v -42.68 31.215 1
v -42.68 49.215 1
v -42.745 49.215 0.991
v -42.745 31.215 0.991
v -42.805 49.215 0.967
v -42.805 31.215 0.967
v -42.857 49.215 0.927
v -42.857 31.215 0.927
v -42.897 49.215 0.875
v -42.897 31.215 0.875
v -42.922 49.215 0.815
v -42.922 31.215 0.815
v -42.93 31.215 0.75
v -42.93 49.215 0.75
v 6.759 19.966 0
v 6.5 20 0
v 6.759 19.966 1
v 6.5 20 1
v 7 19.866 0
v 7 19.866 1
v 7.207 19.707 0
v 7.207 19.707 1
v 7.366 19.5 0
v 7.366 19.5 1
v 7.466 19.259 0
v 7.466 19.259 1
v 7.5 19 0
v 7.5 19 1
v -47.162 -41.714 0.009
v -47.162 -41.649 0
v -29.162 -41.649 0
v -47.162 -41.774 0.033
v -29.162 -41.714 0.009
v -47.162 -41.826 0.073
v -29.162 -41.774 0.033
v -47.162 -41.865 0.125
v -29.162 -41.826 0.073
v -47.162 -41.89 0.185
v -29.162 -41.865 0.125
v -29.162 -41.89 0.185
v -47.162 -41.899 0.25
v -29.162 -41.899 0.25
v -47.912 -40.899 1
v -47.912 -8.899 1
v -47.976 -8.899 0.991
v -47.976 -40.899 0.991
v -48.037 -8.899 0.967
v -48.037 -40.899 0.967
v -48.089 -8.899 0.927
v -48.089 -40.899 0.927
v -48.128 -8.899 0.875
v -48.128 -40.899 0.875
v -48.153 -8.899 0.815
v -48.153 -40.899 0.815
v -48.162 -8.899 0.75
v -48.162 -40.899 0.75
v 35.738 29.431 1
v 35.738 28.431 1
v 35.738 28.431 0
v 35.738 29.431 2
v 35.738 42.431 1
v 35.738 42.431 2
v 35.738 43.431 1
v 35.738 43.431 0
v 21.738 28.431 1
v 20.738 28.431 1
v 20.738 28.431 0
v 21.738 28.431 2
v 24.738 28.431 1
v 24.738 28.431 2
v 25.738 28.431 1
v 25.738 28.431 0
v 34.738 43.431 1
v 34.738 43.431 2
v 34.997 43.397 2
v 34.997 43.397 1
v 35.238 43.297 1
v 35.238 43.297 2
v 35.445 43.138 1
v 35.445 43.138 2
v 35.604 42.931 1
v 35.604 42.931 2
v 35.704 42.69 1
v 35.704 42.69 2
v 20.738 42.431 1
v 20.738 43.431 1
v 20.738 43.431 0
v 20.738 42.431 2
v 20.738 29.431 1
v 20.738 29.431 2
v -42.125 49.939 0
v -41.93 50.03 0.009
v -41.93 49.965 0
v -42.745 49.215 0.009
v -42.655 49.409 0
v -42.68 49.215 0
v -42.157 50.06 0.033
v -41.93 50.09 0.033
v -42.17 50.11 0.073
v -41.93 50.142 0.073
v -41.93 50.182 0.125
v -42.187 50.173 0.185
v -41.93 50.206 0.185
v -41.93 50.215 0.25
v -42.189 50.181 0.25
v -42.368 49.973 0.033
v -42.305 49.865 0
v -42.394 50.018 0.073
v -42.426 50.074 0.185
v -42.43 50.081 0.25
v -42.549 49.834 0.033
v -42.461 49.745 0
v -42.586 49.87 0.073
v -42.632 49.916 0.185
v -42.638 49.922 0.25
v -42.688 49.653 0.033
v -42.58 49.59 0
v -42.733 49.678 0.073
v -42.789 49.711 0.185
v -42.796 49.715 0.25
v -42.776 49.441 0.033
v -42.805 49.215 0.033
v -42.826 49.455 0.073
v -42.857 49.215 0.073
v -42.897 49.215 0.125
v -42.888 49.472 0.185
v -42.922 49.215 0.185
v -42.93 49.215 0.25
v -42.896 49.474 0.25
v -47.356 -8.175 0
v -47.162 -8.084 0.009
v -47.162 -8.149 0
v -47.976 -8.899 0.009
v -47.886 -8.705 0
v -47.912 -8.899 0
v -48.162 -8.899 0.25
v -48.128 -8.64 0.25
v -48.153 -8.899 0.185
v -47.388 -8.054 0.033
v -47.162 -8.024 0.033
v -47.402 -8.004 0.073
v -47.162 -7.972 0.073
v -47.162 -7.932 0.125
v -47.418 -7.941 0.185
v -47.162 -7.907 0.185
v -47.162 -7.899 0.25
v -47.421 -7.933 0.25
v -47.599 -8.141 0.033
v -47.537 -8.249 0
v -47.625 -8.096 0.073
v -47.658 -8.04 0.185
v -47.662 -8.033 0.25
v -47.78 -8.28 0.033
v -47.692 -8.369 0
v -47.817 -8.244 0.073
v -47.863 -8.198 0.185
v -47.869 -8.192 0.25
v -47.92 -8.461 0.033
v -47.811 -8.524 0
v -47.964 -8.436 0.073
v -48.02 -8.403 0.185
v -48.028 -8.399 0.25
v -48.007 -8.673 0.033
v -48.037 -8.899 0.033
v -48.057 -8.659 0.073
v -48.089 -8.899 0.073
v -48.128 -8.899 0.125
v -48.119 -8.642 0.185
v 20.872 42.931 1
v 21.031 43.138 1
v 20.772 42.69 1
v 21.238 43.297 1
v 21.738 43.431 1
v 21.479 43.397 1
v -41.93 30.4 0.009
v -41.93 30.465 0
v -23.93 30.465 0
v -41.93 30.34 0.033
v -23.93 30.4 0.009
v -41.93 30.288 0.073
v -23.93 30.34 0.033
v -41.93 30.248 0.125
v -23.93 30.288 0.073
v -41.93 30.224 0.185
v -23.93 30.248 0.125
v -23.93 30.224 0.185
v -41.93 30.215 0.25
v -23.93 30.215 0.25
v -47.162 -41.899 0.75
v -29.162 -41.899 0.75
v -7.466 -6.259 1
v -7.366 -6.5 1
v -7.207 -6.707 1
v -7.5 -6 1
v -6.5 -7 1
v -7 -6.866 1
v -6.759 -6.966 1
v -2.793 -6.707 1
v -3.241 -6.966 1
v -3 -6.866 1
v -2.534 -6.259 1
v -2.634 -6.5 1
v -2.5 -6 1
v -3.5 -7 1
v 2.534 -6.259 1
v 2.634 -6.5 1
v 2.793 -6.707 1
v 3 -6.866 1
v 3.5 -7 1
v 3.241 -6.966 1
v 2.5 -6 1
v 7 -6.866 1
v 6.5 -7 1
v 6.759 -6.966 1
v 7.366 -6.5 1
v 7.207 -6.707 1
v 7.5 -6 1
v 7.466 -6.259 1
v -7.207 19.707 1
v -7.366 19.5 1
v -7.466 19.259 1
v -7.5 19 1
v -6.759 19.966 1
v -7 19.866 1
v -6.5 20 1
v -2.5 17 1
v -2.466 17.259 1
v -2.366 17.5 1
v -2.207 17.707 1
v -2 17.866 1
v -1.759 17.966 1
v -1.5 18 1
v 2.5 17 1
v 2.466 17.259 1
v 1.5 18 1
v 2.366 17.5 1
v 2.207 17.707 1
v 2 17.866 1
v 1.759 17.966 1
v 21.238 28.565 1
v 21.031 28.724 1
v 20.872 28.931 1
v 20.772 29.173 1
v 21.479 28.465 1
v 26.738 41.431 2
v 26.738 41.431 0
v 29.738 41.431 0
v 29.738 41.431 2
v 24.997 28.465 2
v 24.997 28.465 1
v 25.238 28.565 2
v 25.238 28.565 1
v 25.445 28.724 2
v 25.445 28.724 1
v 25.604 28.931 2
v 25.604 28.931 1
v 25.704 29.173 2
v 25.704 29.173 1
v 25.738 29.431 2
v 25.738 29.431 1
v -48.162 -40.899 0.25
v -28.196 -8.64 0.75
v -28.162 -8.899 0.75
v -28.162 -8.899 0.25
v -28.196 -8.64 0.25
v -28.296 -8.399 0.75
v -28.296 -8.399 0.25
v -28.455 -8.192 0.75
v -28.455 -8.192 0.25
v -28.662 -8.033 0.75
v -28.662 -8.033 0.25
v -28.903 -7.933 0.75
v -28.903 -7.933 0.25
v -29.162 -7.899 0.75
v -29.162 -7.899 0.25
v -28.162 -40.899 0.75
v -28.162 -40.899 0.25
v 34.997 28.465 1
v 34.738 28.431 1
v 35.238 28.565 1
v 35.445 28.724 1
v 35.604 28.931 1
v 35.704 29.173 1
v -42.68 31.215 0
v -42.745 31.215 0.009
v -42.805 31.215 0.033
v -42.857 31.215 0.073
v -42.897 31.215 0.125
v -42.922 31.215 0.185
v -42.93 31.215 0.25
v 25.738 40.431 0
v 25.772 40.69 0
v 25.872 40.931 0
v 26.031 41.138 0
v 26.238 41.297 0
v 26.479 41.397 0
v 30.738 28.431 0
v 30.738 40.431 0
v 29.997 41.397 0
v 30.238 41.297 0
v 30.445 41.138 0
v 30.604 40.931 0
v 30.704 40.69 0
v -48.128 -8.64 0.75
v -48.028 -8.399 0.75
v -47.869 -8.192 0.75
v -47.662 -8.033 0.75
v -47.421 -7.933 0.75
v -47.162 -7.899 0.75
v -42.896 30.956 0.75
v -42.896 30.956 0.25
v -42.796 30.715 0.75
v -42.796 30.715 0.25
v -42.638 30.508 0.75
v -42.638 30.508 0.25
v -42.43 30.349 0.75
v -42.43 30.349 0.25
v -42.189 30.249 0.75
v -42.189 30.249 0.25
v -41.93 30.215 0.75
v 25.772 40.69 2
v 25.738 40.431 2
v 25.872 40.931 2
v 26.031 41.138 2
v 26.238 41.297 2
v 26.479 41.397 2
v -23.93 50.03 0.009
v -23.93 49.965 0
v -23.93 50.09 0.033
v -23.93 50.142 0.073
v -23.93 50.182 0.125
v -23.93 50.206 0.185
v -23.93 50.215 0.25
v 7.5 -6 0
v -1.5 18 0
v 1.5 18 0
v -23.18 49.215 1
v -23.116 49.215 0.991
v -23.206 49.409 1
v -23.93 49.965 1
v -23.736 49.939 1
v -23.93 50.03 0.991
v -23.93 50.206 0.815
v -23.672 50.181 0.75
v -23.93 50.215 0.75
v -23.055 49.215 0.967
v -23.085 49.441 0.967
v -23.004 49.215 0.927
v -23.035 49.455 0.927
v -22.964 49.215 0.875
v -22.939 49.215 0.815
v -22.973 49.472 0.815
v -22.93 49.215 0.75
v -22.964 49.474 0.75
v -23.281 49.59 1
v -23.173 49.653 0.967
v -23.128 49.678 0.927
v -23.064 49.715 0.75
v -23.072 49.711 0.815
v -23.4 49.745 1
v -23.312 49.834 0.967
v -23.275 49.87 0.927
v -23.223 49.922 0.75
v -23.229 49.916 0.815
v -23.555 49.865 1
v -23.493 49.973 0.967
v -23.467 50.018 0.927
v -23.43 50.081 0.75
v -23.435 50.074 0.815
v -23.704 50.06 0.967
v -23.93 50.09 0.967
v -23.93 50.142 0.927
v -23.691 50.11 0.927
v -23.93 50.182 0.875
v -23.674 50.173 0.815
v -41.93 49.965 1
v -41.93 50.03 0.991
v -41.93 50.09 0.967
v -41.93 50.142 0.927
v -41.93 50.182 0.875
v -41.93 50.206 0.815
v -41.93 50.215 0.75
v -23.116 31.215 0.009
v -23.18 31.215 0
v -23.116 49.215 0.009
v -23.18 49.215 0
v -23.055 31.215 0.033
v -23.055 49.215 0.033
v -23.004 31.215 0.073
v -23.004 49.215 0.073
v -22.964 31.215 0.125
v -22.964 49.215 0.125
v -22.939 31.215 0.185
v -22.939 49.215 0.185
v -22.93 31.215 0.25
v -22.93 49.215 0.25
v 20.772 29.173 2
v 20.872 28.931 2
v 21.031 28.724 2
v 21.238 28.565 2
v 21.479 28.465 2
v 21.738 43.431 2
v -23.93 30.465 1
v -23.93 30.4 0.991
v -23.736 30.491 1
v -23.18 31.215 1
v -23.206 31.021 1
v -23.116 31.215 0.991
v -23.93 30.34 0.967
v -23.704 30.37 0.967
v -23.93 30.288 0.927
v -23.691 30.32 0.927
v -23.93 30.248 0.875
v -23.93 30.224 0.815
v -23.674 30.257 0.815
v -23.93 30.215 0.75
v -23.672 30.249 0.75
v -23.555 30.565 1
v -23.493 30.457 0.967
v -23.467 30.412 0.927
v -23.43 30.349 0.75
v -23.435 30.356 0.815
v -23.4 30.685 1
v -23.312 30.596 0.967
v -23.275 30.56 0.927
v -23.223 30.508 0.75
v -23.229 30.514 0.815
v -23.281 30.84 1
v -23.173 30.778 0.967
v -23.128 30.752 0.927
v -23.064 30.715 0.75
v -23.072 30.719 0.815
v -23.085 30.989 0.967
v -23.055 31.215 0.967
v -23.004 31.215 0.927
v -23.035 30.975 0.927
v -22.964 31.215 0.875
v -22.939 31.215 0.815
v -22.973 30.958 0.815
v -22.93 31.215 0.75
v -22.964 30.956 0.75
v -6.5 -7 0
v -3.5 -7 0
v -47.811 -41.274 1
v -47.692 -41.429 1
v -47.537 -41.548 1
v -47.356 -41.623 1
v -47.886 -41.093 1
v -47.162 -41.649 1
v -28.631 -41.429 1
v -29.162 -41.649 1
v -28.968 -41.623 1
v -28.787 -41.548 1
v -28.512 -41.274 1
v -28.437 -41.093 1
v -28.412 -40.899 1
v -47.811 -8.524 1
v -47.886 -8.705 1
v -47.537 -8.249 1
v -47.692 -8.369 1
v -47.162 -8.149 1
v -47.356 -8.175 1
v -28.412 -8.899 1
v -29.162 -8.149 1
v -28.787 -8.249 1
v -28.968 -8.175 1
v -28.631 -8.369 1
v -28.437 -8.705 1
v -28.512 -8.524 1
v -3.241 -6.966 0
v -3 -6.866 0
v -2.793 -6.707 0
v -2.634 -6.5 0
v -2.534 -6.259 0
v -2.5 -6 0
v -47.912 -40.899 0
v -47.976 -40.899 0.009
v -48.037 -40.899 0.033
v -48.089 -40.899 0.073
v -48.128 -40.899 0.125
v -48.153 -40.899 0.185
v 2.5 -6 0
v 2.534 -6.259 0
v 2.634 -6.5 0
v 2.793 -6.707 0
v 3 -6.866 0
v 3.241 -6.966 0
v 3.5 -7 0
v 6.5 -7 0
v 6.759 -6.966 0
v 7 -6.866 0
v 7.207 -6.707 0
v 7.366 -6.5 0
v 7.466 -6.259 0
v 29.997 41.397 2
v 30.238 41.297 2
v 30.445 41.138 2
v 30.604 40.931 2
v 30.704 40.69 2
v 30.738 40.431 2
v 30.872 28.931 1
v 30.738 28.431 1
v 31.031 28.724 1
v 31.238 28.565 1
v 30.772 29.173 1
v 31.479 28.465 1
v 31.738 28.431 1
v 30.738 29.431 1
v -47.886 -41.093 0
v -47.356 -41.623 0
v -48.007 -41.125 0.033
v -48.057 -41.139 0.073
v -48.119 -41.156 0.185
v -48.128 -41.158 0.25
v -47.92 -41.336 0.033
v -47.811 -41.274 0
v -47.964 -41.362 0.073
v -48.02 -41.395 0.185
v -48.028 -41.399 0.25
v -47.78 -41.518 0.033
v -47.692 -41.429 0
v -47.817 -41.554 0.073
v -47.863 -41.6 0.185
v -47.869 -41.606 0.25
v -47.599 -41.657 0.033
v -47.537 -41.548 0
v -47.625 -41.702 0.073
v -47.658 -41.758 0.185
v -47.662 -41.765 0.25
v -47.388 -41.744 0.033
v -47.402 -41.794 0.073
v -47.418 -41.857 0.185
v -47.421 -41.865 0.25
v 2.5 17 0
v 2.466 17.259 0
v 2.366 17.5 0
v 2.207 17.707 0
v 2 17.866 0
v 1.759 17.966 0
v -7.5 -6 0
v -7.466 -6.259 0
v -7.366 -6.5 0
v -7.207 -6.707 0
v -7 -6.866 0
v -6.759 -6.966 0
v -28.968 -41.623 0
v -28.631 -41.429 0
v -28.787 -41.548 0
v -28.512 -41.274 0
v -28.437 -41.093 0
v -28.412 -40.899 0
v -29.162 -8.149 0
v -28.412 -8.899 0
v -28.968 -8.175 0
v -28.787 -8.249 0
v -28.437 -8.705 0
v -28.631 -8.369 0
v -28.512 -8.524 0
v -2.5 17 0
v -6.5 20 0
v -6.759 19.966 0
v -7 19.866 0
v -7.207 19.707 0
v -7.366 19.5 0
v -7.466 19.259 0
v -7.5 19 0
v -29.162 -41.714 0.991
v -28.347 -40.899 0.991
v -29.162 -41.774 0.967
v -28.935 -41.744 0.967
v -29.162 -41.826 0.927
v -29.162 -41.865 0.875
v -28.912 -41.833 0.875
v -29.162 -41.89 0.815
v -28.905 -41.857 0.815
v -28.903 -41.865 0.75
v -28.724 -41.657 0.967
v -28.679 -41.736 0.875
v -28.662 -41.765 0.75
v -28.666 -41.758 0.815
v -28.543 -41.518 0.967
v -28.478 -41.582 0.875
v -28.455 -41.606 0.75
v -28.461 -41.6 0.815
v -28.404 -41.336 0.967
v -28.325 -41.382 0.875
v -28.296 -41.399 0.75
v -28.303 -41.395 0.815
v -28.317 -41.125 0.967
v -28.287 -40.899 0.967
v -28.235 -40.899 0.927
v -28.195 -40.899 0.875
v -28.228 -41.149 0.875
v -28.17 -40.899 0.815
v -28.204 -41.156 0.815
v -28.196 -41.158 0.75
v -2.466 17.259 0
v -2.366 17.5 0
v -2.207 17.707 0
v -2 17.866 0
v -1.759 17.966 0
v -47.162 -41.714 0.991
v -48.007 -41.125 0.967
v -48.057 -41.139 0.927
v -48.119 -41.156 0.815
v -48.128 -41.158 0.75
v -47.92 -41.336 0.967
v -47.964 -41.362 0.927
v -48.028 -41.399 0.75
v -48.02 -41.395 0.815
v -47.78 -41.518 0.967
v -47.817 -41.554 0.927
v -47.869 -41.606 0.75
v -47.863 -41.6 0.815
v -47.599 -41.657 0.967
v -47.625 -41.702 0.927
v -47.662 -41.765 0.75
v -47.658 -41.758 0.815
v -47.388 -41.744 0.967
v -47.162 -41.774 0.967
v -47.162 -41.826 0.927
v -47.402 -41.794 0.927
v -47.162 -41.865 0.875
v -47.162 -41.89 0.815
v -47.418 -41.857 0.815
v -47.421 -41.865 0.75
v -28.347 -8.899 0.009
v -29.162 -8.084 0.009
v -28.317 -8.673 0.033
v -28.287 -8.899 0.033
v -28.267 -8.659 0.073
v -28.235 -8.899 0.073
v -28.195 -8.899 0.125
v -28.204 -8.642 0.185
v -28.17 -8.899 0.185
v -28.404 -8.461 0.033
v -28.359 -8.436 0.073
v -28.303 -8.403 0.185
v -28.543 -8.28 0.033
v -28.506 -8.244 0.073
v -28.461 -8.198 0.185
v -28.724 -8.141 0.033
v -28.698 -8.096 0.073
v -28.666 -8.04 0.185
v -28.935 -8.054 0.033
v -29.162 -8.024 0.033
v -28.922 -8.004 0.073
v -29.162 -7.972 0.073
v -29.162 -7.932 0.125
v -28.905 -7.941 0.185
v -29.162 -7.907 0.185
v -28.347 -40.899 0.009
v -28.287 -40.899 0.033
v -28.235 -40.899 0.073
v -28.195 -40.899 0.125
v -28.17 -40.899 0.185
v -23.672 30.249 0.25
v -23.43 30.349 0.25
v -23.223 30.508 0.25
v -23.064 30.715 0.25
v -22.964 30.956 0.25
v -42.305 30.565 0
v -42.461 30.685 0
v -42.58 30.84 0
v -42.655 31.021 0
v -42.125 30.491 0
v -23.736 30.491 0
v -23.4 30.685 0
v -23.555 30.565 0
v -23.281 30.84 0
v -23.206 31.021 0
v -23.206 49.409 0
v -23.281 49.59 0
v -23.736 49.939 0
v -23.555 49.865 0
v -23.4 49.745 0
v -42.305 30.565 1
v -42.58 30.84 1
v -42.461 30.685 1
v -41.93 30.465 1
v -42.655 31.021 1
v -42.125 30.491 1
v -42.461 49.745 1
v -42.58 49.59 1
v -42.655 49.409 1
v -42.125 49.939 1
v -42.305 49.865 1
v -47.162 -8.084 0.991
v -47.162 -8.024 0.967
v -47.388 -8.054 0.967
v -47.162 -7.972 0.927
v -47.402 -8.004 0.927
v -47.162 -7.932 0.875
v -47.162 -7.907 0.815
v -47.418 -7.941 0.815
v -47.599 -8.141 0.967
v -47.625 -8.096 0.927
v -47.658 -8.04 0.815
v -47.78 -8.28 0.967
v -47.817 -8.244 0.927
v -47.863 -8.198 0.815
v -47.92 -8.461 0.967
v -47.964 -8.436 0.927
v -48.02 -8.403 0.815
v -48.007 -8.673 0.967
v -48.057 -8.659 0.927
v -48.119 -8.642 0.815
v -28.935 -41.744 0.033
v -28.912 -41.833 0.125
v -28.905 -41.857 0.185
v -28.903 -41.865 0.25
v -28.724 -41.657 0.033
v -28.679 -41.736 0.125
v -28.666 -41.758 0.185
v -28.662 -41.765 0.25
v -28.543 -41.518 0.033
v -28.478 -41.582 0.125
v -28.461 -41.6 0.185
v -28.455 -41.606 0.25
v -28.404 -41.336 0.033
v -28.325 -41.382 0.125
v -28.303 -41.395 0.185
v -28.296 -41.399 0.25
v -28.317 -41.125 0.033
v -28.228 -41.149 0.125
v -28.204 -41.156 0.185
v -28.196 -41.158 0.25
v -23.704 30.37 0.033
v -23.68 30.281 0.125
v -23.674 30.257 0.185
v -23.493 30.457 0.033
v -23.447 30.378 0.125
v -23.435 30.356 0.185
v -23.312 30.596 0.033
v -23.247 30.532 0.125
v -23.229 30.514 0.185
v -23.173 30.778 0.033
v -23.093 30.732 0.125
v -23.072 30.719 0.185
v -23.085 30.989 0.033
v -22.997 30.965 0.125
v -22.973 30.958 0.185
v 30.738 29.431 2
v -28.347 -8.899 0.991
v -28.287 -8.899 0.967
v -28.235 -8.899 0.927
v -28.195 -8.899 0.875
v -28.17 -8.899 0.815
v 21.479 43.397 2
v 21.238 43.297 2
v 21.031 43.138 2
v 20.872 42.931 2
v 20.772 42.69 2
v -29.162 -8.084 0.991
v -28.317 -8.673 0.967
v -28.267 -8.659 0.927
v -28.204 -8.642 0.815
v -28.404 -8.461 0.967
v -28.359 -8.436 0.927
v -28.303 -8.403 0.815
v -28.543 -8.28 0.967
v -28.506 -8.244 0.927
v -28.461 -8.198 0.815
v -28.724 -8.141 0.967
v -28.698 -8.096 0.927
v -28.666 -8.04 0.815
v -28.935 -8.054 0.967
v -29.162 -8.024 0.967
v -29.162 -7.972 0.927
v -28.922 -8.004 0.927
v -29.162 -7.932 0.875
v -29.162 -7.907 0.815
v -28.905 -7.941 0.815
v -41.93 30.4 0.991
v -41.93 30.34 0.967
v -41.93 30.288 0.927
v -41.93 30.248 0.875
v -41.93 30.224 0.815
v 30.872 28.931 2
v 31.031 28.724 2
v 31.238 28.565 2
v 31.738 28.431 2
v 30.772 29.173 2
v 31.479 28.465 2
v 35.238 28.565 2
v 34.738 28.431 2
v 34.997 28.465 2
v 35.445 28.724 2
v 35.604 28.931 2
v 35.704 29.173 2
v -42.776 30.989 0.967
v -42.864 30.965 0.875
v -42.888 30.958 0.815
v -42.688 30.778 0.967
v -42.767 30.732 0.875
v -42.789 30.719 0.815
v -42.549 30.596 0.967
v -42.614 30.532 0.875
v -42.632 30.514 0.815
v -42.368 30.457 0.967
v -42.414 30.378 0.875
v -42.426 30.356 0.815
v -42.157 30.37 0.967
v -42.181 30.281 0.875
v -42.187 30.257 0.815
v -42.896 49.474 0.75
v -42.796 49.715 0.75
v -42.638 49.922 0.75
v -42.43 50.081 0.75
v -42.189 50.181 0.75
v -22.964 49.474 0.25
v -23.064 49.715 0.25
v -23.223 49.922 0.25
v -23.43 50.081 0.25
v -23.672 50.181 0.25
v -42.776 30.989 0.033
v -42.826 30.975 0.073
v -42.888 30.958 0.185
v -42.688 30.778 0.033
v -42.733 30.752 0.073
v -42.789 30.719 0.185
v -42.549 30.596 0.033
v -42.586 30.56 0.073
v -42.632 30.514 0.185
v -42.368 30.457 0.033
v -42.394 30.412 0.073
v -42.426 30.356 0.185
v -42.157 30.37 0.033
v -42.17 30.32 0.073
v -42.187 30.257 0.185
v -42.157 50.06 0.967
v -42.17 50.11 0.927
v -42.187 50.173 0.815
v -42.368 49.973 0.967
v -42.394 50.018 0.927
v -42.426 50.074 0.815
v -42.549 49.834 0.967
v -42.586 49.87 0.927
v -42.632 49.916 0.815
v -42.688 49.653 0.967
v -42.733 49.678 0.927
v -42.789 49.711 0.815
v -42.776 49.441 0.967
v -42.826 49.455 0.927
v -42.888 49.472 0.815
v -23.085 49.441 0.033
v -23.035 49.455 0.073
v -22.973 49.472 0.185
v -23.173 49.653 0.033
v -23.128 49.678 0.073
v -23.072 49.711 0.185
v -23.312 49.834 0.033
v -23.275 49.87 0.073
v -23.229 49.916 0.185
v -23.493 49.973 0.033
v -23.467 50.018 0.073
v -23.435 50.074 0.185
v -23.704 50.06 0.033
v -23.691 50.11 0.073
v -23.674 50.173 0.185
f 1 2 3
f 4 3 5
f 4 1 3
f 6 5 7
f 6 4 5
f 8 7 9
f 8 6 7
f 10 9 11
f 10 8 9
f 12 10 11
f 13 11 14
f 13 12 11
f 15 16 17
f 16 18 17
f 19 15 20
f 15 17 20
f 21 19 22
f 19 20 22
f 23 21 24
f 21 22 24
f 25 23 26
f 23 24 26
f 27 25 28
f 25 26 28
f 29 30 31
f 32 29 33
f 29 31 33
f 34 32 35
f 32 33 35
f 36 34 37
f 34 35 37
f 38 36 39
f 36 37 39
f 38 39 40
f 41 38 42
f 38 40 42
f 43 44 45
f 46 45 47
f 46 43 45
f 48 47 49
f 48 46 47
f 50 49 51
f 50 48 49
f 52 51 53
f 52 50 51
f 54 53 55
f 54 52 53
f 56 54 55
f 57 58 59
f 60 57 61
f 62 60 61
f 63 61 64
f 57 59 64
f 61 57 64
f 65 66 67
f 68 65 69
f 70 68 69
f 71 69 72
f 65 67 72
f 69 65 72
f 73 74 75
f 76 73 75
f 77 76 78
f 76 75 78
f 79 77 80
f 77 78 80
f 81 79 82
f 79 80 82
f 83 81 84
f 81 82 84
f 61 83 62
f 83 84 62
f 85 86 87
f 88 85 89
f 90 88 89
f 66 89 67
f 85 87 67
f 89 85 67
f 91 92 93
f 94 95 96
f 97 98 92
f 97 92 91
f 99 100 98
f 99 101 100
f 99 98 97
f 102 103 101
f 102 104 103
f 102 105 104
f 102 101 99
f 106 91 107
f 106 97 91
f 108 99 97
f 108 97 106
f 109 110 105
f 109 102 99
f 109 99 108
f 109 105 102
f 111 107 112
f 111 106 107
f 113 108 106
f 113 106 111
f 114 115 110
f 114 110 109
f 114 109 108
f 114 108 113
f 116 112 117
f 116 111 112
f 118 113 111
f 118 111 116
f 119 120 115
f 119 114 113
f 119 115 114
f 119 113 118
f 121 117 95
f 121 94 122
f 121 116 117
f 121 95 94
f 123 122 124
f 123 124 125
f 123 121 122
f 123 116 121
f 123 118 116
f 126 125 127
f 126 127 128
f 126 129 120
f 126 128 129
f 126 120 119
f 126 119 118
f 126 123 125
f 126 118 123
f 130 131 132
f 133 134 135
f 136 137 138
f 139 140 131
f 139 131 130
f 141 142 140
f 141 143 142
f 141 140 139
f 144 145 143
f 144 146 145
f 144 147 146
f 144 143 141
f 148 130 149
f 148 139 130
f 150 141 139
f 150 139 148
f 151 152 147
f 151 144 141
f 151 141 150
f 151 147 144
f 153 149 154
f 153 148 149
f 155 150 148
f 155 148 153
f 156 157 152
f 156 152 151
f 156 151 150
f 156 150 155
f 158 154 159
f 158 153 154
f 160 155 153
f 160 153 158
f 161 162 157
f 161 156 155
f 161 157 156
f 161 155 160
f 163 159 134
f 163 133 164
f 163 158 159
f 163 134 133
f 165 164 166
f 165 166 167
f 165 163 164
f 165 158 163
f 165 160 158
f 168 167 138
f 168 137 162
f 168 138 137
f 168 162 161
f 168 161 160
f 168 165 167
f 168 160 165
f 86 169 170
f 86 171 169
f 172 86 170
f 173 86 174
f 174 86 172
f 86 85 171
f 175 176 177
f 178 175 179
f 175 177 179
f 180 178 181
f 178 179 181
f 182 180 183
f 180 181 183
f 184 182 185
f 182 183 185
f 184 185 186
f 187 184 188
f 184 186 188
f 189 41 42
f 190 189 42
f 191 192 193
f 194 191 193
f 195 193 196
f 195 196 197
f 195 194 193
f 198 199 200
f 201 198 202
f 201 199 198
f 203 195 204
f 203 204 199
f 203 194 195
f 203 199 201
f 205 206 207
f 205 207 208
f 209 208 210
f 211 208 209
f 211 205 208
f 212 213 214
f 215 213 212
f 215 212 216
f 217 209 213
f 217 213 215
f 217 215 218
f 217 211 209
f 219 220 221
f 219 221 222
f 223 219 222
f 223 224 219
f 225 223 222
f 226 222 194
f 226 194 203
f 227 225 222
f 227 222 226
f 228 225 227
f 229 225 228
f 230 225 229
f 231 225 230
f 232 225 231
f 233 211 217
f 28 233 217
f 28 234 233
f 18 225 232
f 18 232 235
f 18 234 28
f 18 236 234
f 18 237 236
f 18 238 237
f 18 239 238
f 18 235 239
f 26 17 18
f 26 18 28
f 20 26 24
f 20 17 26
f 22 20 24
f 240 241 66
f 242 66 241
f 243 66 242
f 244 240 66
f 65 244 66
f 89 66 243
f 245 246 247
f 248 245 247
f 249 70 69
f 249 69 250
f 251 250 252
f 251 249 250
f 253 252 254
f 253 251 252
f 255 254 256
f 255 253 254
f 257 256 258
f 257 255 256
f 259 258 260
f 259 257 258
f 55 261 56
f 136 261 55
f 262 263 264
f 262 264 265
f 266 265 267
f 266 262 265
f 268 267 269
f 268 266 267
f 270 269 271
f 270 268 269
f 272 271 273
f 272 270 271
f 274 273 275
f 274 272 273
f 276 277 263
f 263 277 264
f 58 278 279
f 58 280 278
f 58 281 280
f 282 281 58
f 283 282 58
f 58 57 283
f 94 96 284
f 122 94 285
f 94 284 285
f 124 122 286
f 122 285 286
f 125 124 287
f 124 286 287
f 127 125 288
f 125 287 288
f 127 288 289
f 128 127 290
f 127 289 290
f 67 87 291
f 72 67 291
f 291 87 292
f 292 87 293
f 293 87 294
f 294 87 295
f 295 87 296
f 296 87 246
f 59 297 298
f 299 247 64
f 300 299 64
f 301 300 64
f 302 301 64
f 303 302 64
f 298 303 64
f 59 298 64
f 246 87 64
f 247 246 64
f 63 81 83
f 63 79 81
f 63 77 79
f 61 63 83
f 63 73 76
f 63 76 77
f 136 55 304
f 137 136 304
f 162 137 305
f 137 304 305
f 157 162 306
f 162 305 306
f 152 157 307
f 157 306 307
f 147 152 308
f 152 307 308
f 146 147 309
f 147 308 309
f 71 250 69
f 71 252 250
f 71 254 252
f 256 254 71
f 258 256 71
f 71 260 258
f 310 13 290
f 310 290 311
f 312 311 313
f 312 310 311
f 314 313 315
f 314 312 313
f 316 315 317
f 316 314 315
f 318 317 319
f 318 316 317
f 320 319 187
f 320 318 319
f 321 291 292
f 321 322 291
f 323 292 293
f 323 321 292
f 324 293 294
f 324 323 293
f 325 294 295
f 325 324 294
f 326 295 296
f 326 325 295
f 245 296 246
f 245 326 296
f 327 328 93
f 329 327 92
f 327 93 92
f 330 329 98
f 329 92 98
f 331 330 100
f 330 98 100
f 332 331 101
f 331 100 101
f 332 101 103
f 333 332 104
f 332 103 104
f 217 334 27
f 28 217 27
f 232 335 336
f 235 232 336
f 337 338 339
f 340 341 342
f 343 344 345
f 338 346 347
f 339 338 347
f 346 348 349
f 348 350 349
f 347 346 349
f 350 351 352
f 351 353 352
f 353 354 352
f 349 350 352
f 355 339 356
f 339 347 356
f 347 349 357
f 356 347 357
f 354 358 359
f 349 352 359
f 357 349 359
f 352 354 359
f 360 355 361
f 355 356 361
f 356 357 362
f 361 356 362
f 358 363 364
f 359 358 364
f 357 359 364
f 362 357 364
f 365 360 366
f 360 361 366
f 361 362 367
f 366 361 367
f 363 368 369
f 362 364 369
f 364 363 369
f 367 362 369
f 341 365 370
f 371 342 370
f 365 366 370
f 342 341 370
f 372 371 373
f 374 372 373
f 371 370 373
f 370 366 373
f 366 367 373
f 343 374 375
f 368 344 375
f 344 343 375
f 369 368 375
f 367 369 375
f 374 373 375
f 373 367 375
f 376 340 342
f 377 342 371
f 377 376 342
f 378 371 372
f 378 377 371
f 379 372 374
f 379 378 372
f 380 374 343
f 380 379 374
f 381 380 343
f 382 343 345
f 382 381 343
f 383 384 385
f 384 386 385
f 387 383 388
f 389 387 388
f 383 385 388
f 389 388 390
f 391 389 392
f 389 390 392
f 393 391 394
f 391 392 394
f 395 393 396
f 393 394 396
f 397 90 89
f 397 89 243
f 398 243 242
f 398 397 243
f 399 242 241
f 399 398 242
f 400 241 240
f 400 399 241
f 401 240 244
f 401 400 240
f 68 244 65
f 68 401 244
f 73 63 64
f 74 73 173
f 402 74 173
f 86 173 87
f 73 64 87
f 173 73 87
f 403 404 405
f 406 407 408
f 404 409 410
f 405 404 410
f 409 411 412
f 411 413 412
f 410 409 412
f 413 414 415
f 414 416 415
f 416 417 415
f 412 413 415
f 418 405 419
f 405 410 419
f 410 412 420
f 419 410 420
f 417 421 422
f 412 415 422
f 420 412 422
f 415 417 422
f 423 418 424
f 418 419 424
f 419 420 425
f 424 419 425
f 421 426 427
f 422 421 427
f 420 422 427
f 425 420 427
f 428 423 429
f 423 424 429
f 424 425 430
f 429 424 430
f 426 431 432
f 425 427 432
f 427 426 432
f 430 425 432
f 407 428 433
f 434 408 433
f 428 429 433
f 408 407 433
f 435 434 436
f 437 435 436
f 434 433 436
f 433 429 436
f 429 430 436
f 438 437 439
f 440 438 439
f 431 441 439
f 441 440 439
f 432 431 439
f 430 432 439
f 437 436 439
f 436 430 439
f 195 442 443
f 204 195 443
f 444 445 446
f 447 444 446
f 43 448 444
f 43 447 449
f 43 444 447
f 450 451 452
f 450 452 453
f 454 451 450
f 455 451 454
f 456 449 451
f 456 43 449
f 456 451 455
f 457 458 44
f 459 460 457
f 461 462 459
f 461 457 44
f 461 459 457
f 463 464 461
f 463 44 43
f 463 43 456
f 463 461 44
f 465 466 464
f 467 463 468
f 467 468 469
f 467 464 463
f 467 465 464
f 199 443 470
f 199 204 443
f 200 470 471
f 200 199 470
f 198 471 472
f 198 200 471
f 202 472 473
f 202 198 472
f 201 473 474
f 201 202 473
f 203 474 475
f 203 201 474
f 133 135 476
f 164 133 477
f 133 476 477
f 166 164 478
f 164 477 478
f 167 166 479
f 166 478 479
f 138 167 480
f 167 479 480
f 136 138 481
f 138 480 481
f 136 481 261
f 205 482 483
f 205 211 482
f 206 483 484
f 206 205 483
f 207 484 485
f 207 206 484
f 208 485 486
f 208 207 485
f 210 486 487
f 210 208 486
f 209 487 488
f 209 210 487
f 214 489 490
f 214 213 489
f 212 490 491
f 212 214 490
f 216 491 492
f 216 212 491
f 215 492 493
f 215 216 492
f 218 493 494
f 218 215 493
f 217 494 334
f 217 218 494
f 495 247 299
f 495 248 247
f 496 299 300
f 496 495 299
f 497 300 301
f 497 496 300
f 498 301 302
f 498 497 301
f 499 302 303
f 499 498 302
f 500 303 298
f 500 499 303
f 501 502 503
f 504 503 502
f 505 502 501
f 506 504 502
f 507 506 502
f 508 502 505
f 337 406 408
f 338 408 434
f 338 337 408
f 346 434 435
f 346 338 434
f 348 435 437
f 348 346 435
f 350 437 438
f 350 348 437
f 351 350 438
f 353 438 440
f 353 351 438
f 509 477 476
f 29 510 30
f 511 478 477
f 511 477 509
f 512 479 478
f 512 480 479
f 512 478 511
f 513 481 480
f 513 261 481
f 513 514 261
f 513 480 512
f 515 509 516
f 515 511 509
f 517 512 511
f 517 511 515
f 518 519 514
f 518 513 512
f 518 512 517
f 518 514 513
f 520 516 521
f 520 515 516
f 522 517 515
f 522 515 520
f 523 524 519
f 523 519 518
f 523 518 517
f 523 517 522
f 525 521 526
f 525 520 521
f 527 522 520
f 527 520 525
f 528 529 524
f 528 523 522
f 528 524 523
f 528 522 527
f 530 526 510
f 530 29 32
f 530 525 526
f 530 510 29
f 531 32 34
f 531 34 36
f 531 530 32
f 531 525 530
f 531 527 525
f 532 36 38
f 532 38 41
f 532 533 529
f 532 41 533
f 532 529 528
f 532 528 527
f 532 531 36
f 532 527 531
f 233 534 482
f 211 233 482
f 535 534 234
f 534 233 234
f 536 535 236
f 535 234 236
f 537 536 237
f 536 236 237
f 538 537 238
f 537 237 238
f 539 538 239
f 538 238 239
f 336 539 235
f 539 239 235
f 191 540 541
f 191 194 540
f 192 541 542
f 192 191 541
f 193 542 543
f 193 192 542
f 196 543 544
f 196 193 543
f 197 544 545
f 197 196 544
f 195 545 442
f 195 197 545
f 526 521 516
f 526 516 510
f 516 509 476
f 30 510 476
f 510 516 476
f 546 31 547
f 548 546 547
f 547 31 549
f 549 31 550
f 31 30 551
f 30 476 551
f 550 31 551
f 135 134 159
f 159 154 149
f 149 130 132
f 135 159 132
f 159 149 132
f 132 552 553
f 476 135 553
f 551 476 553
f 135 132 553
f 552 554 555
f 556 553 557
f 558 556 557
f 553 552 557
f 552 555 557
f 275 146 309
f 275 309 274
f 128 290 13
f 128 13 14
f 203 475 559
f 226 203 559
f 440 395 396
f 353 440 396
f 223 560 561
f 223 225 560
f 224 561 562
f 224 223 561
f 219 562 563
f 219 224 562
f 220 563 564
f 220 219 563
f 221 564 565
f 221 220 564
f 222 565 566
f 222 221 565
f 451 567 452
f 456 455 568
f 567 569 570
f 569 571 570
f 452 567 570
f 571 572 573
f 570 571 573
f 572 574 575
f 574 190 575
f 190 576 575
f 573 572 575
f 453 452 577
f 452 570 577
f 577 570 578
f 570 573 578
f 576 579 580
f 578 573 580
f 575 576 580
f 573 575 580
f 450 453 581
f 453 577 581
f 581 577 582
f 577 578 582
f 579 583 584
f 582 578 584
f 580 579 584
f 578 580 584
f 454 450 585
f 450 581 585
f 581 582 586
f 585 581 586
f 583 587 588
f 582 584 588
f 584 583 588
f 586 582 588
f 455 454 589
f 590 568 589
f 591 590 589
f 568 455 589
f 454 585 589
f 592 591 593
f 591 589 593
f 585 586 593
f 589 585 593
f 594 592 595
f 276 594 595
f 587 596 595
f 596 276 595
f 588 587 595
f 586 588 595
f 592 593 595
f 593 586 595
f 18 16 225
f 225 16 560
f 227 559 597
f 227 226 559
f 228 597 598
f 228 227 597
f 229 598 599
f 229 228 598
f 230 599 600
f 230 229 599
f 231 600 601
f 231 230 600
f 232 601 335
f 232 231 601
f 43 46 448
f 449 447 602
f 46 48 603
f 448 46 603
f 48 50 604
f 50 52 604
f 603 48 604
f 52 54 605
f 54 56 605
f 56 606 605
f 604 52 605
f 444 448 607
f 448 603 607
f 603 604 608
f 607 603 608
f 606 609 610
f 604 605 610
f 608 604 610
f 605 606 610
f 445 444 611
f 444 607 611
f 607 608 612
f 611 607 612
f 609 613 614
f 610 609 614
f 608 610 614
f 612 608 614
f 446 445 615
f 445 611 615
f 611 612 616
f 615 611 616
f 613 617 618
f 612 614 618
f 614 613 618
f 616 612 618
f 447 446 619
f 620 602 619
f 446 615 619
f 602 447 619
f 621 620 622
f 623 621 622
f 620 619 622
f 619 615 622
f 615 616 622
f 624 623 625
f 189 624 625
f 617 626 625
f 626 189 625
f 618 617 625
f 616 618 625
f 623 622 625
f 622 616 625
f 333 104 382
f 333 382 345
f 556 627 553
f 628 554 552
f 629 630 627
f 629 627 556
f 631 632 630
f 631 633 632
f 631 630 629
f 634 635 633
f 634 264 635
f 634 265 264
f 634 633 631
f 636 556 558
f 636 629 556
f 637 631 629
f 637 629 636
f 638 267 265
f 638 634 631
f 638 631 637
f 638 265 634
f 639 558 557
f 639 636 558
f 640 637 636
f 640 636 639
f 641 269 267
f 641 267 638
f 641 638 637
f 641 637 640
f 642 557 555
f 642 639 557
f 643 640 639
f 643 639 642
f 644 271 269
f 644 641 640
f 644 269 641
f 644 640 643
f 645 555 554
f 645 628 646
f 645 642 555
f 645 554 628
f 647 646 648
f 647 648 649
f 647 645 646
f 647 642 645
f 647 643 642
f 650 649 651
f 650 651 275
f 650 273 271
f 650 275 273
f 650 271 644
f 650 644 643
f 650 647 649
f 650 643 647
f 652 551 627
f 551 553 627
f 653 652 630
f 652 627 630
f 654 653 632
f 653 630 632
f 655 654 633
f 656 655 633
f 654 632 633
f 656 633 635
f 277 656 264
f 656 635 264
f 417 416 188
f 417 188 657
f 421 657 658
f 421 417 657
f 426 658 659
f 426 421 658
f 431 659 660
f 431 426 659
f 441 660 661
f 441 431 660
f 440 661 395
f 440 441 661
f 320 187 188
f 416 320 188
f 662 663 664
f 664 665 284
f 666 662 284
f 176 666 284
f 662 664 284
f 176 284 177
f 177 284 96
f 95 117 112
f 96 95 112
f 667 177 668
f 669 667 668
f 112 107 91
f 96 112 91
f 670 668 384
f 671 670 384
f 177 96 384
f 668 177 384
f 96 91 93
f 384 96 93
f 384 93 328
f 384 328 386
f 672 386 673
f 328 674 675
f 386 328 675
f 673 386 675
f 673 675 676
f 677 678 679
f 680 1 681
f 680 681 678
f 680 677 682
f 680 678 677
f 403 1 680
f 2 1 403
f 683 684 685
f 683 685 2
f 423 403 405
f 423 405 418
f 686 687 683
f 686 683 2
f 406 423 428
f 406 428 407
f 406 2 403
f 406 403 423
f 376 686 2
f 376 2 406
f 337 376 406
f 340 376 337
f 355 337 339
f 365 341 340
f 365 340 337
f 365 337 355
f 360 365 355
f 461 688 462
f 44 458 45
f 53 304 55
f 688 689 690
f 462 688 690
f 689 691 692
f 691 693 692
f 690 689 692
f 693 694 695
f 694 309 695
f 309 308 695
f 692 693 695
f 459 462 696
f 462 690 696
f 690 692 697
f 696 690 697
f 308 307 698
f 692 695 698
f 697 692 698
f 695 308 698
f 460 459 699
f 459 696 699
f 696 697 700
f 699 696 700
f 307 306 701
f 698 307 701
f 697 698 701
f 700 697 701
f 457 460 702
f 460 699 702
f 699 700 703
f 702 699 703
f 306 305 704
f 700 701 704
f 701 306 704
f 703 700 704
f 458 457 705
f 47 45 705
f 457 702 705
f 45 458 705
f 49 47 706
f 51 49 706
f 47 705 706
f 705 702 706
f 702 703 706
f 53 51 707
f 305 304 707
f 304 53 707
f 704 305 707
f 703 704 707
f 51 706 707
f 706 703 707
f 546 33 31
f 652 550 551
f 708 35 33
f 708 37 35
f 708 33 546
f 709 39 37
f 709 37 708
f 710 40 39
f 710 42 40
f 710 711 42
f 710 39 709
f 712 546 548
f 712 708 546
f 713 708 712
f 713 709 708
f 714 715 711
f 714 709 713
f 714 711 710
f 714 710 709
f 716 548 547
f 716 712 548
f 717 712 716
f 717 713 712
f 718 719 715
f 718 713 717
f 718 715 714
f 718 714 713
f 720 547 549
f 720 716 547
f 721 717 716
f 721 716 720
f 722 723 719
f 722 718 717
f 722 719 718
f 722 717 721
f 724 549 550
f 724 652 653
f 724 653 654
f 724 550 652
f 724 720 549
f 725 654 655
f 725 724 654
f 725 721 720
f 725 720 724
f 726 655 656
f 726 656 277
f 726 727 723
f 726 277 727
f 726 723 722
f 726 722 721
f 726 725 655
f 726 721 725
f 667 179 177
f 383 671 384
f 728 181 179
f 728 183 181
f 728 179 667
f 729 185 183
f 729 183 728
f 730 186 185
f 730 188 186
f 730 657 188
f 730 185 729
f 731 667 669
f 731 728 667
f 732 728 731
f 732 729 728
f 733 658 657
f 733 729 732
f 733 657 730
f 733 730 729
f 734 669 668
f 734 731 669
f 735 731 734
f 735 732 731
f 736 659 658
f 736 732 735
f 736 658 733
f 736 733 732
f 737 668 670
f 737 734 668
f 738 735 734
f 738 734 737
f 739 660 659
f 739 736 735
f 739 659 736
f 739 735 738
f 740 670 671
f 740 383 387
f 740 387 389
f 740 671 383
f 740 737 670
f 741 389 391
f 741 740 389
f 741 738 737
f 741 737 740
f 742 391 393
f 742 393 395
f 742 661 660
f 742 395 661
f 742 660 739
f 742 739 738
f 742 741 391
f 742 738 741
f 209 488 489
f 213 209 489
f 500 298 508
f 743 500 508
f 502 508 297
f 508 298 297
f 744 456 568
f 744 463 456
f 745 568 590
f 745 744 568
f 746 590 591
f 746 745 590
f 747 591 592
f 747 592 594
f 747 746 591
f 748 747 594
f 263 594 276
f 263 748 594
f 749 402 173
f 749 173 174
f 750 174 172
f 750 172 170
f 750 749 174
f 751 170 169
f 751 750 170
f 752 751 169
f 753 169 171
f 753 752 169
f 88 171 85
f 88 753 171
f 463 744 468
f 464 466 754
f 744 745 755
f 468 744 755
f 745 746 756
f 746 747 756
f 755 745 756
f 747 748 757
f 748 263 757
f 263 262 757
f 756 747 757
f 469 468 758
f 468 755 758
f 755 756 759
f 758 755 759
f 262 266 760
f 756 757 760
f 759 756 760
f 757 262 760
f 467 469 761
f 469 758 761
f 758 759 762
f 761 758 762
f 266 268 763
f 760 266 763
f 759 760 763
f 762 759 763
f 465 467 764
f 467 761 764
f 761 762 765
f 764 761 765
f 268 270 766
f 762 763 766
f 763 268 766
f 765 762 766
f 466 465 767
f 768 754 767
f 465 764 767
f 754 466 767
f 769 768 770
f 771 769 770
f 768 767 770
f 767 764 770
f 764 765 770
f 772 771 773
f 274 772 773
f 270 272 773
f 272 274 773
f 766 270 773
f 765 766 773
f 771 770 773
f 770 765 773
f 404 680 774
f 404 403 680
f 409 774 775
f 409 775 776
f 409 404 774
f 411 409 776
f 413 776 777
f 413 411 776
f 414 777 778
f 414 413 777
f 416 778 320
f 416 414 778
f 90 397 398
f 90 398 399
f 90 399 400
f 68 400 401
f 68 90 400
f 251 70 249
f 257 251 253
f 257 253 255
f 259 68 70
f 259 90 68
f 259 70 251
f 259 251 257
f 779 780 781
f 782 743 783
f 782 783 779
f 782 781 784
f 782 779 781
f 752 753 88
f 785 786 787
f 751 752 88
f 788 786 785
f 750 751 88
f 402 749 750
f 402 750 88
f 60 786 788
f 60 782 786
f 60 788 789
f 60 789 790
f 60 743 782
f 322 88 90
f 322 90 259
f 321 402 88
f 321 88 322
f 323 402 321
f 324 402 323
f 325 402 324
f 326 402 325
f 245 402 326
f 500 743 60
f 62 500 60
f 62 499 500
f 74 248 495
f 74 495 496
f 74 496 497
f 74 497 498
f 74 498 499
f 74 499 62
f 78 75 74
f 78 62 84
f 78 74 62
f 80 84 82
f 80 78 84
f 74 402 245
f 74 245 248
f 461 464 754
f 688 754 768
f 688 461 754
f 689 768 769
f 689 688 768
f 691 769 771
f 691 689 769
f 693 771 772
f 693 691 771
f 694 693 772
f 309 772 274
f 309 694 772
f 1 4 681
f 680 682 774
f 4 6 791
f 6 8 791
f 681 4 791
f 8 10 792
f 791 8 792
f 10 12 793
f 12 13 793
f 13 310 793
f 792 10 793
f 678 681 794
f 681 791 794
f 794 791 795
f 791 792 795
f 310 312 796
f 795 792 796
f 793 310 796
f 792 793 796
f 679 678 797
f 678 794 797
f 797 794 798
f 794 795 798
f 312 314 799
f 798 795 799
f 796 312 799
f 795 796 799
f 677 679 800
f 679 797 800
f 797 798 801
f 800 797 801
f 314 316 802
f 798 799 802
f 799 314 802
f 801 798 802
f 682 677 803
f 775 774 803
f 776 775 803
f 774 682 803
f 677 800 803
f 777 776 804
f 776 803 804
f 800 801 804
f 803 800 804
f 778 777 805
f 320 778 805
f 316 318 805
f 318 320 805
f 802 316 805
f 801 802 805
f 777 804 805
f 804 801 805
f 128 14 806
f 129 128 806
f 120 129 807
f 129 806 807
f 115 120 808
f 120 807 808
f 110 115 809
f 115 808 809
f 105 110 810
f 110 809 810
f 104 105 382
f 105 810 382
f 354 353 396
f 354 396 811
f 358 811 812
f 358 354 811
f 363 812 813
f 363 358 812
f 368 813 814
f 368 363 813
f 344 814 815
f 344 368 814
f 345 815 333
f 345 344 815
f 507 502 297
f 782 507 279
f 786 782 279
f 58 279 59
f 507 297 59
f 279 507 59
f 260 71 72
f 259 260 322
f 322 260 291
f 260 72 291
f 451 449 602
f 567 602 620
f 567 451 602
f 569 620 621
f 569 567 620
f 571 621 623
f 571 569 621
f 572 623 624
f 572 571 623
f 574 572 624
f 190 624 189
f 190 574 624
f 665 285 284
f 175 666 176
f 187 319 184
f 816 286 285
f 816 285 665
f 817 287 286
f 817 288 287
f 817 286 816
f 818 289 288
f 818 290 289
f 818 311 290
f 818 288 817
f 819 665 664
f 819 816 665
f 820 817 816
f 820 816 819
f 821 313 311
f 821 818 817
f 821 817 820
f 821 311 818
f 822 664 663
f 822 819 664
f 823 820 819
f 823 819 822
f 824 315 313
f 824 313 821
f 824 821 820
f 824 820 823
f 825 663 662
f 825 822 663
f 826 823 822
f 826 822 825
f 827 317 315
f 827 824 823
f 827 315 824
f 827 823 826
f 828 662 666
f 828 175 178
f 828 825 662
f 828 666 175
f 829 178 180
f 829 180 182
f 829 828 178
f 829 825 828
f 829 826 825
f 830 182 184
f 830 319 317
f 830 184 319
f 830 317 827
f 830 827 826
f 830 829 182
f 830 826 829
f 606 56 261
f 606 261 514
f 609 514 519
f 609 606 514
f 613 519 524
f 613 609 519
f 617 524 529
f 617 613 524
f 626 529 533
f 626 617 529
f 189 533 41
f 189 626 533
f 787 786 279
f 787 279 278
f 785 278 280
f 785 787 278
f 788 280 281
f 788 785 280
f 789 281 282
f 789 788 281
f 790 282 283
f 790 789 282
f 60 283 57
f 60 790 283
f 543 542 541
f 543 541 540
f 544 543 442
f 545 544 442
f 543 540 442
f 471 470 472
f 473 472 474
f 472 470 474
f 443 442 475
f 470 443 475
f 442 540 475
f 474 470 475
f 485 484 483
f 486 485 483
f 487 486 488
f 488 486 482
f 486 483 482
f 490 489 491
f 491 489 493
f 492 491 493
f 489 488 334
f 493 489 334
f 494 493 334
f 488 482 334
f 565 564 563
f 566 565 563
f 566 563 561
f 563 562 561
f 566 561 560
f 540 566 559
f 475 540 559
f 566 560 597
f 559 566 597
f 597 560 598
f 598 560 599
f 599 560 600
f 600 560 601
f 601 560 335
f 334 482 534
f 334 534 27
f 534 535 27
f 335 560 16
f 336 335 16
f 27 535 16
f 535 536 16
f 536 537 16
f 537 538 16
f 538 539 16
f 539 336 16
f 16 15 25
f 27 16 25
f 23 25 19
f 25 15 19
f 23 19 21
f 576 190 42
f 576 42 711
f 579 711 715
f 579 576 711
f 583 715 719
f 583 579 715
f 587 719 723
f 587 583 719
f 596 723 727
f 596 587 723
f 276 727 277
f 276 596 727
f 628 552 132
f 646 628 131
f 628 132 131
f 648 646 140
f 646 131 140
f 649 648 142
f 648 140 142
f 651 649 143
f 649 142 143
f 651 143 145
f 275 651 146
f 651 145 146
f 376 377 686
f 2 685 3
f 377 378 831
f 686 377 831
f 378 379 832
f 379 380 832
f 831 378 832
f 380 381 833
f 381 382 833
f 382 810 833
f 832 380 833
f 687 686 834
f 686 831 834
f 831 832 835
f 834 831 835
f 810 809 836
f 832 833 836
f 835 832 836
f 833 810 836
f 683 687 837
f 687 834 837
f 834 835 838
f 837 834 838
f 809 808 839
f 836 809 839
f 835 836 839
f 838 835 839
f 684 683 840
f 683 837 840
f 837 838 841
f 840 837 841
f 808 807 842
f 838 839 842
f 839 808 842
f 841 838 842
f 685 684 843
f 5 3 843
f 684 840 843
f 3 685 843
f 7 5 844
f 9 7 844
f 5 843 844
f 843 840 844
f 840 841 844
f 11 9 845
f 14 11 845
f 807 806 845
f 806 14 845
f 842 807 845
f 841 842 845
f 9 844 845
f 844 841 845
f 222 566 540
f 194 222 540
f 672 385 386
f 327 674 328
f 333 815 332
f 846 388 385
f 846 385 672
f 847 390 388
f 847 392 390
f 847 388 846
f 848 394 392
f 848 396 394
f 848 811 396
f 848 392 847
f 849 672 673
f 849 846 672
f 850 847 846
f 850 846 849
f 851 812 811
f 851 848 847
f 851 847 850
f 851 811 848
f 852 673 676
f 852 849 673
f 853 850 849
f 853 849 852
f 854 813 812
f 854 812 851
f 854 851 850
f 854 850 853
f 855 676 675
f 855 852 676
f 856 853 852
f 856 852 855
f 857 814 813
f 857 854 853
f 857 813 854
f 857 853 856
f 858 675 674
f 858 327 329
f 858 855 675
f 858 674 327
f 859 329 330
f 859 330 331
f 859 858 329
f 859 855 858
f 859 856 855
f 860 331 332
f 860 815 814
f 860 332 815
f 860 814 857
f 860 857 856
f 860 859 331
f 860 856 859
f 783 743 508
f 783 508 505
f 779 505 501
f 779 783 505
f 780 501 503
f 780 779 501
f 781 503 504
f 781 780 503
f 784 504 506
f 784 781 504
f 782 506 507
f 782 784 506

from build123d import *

# Parameters (mm, degrees)
F0_W      = 20
F0_H      = 20
F1_DEPTH  = 1
F2_R      = 1
F3_R      = 0.25
F5_DEPTH  = 2
F6_R      = 1
F8_DEPTH  = 1
F9_R      = 1
F10_W     = 20
F10_H     = 34
F11_DEPTH = 1
F12_R     = 1
F13_R     = 0.25
F14_R     = 1


# Not quite as in the source:
# - two fillets or chamfers of one size are made in one step


with BuildPart() as f1:
    # F0 (on Top) → F1 (new body)
    with BuildSketch(Plane.XY):
        with Locations((-32.9304196417, 40.2150040078)):
            Rectangle(F0_W, F0_H)
    extrude(amount=F1_DEPTH)

    # F2
    f2_edges = [f1.edges().sort_by_distance(p)[0] for p in [
        (-42.93042, 50.215004, 0.5),
        (-22.93042, 50.215004, 0.5),
        (-22.93042, 30.215004, 0.5),
        (-42.93042, 30.215004, 0.5),
    ]]
    fillet(f2_edges, radius=F2_R)

    # F3
    f3_edges = [f1.edges().sort_by_distance(p)[0] for p in [
        (-32.93042, 30.215004, 1),
        (-22.93042, 40.215004, 0),
        (-22.93042, 31.215004, 0.5),
        (-22.93042, 49.215004, 0.5),
        (-22.93042, 40.215004, 1),
    ]]
    fillet(f3_edges, radius=F3_R)


with BuildPart() as f5:
    # F4 (on Top) → F5 (new body)
    with BuildSketch(Plane.XY):
        Polygon((35.7377539144, 43.4313830447), (20.7377539144, 43.4313830447), (20.7377539144, 28.4313830447), (25.7377539144, 28.4313830447), (25.7377539144, 41.4313830447), (30.7377539144, 41.4313830447), (30.7377539144, 28.4313830447), (35.7377539144, 28.4313830447), align=None)
    extrude(amount=F5_DEPTH)

    # F6
    f6_edges = [f5.edges().sort_by_distance(p)[0] for p in [
        (35.737754, 43.431383, 1),
        (20.737754, 43.431383, 1),
        (35.737754, 28.431383, 1),
        (30.737754, 28.431383, 1),
        (25.737754, 28.431383, 1),
        (20.737754, 28.431383, 1),
        (25.737754, 41.431383, 1),
        (30.737754, 41.431383, 1),
    ]]
    fillet(f6_edges, radius=F6_R)

    # F4 (on Top) → F8 (join)
    with BuildSketch(Plane.XY):
        Polygon((35.7377539144, 43.4313830447), (20.7377539144, 43.4313830447), (20.7377539144, 28.4313830447), (25.7377539144, 28.4313830447), (25.7377539144, 41.4313830447), (30.7377539144, 41.4313830447), (30.7377539144, 28.4313830447), (35.7377539144, 28.4313830447), align=None)
    extrude(amount=F8_DEPTH)


with BuildPart() as f8:
    # F4 (on Top) → F8, piece 2 (new body)
    with BuildSketch(Plane.XY):
        Polygon((7.5, 20), (-7.5, 20), (-7.5, -7), (-2.5, -7), (-2.5, 18), (2.5, 18), (2.5, -7), (7.5, -7), align=None)
    extrude(amount=F8_DEPTH)

    # F9
    f9_edges = [f8.edges().sort_by_distance(p)[0] for p in [
        (-7.5, -7, 0.5),
        (2.5, -7, 0.5),
        (-2.5, -7, 0.5),
        (7.5, -7, 0.5),
        (7.5, 20, 0.5),
        (-7.5, 20, 0.5),
    ]]
    fillet(f9_edges, radius=F9_R)

    # F14
    f14_edges = [f8.edges().sort_by_distance(p)[0] for p in [
        (-2.5, 18, 0.5),
        (2.5, 18, 0.5),
    ]]
    fillet(f14_edges, radius=F14_R)


with BuildPart() as f11:
    # F10 (on Top) → F11 (new body)
    with BuildSketch(Plane.XY):
        with Locations((-38.1617667153, -24.8989770475)):
            Rectangle(F10_W, F10_H)
    extrude(amount=F11_DEPTH)

    # F12
    f12_edges = [f11.edges().sort_by_distance(p)[0] for p in [
        (-28.161767, -41.898977, 0.5),
        (-28.161767, -7.898977, 0.5),
        (-48.161767, -41.898977, 0.5),
        (-48.161767, -7.898977, 0.5),
    ]]
    fillet(f12_edges, radius=F12_R)

    # F13
    f13_edges = [f11.edges().sort_by_distance(p)[0] for p in [
        (-28.161767, -24.898977, 1),
        (-28.45466, -41.606084, 1),
        (-28.45466, -8.19187, 1),
        (-38.161767, -41.898977, 1),
        (-38.161767, -7.898977, 1),
        (-47.868873, -41.606084, 1),
        (-47.868873, -8.19187, 1),
        (-48.161767, -24.898977, 1),
        (-28.161767, -24.898977, 0),
        (-28.45466, -41.606084, 0),
        (-28.45466, -8.19187, 0),
        (-38.161767, -41.898977, 0),
        (-38.161767, -7.898977, 0),
        (-47.868873, -41.606084, 0),
        (-47.868873, -8.19187, 0),
        (-48.161767, -24.898977, 0),
    ]]
    fillet(f13_edges, radius=F13_R)


solid = Compound([f1.part, f5.part, f8.part, f11.part])
